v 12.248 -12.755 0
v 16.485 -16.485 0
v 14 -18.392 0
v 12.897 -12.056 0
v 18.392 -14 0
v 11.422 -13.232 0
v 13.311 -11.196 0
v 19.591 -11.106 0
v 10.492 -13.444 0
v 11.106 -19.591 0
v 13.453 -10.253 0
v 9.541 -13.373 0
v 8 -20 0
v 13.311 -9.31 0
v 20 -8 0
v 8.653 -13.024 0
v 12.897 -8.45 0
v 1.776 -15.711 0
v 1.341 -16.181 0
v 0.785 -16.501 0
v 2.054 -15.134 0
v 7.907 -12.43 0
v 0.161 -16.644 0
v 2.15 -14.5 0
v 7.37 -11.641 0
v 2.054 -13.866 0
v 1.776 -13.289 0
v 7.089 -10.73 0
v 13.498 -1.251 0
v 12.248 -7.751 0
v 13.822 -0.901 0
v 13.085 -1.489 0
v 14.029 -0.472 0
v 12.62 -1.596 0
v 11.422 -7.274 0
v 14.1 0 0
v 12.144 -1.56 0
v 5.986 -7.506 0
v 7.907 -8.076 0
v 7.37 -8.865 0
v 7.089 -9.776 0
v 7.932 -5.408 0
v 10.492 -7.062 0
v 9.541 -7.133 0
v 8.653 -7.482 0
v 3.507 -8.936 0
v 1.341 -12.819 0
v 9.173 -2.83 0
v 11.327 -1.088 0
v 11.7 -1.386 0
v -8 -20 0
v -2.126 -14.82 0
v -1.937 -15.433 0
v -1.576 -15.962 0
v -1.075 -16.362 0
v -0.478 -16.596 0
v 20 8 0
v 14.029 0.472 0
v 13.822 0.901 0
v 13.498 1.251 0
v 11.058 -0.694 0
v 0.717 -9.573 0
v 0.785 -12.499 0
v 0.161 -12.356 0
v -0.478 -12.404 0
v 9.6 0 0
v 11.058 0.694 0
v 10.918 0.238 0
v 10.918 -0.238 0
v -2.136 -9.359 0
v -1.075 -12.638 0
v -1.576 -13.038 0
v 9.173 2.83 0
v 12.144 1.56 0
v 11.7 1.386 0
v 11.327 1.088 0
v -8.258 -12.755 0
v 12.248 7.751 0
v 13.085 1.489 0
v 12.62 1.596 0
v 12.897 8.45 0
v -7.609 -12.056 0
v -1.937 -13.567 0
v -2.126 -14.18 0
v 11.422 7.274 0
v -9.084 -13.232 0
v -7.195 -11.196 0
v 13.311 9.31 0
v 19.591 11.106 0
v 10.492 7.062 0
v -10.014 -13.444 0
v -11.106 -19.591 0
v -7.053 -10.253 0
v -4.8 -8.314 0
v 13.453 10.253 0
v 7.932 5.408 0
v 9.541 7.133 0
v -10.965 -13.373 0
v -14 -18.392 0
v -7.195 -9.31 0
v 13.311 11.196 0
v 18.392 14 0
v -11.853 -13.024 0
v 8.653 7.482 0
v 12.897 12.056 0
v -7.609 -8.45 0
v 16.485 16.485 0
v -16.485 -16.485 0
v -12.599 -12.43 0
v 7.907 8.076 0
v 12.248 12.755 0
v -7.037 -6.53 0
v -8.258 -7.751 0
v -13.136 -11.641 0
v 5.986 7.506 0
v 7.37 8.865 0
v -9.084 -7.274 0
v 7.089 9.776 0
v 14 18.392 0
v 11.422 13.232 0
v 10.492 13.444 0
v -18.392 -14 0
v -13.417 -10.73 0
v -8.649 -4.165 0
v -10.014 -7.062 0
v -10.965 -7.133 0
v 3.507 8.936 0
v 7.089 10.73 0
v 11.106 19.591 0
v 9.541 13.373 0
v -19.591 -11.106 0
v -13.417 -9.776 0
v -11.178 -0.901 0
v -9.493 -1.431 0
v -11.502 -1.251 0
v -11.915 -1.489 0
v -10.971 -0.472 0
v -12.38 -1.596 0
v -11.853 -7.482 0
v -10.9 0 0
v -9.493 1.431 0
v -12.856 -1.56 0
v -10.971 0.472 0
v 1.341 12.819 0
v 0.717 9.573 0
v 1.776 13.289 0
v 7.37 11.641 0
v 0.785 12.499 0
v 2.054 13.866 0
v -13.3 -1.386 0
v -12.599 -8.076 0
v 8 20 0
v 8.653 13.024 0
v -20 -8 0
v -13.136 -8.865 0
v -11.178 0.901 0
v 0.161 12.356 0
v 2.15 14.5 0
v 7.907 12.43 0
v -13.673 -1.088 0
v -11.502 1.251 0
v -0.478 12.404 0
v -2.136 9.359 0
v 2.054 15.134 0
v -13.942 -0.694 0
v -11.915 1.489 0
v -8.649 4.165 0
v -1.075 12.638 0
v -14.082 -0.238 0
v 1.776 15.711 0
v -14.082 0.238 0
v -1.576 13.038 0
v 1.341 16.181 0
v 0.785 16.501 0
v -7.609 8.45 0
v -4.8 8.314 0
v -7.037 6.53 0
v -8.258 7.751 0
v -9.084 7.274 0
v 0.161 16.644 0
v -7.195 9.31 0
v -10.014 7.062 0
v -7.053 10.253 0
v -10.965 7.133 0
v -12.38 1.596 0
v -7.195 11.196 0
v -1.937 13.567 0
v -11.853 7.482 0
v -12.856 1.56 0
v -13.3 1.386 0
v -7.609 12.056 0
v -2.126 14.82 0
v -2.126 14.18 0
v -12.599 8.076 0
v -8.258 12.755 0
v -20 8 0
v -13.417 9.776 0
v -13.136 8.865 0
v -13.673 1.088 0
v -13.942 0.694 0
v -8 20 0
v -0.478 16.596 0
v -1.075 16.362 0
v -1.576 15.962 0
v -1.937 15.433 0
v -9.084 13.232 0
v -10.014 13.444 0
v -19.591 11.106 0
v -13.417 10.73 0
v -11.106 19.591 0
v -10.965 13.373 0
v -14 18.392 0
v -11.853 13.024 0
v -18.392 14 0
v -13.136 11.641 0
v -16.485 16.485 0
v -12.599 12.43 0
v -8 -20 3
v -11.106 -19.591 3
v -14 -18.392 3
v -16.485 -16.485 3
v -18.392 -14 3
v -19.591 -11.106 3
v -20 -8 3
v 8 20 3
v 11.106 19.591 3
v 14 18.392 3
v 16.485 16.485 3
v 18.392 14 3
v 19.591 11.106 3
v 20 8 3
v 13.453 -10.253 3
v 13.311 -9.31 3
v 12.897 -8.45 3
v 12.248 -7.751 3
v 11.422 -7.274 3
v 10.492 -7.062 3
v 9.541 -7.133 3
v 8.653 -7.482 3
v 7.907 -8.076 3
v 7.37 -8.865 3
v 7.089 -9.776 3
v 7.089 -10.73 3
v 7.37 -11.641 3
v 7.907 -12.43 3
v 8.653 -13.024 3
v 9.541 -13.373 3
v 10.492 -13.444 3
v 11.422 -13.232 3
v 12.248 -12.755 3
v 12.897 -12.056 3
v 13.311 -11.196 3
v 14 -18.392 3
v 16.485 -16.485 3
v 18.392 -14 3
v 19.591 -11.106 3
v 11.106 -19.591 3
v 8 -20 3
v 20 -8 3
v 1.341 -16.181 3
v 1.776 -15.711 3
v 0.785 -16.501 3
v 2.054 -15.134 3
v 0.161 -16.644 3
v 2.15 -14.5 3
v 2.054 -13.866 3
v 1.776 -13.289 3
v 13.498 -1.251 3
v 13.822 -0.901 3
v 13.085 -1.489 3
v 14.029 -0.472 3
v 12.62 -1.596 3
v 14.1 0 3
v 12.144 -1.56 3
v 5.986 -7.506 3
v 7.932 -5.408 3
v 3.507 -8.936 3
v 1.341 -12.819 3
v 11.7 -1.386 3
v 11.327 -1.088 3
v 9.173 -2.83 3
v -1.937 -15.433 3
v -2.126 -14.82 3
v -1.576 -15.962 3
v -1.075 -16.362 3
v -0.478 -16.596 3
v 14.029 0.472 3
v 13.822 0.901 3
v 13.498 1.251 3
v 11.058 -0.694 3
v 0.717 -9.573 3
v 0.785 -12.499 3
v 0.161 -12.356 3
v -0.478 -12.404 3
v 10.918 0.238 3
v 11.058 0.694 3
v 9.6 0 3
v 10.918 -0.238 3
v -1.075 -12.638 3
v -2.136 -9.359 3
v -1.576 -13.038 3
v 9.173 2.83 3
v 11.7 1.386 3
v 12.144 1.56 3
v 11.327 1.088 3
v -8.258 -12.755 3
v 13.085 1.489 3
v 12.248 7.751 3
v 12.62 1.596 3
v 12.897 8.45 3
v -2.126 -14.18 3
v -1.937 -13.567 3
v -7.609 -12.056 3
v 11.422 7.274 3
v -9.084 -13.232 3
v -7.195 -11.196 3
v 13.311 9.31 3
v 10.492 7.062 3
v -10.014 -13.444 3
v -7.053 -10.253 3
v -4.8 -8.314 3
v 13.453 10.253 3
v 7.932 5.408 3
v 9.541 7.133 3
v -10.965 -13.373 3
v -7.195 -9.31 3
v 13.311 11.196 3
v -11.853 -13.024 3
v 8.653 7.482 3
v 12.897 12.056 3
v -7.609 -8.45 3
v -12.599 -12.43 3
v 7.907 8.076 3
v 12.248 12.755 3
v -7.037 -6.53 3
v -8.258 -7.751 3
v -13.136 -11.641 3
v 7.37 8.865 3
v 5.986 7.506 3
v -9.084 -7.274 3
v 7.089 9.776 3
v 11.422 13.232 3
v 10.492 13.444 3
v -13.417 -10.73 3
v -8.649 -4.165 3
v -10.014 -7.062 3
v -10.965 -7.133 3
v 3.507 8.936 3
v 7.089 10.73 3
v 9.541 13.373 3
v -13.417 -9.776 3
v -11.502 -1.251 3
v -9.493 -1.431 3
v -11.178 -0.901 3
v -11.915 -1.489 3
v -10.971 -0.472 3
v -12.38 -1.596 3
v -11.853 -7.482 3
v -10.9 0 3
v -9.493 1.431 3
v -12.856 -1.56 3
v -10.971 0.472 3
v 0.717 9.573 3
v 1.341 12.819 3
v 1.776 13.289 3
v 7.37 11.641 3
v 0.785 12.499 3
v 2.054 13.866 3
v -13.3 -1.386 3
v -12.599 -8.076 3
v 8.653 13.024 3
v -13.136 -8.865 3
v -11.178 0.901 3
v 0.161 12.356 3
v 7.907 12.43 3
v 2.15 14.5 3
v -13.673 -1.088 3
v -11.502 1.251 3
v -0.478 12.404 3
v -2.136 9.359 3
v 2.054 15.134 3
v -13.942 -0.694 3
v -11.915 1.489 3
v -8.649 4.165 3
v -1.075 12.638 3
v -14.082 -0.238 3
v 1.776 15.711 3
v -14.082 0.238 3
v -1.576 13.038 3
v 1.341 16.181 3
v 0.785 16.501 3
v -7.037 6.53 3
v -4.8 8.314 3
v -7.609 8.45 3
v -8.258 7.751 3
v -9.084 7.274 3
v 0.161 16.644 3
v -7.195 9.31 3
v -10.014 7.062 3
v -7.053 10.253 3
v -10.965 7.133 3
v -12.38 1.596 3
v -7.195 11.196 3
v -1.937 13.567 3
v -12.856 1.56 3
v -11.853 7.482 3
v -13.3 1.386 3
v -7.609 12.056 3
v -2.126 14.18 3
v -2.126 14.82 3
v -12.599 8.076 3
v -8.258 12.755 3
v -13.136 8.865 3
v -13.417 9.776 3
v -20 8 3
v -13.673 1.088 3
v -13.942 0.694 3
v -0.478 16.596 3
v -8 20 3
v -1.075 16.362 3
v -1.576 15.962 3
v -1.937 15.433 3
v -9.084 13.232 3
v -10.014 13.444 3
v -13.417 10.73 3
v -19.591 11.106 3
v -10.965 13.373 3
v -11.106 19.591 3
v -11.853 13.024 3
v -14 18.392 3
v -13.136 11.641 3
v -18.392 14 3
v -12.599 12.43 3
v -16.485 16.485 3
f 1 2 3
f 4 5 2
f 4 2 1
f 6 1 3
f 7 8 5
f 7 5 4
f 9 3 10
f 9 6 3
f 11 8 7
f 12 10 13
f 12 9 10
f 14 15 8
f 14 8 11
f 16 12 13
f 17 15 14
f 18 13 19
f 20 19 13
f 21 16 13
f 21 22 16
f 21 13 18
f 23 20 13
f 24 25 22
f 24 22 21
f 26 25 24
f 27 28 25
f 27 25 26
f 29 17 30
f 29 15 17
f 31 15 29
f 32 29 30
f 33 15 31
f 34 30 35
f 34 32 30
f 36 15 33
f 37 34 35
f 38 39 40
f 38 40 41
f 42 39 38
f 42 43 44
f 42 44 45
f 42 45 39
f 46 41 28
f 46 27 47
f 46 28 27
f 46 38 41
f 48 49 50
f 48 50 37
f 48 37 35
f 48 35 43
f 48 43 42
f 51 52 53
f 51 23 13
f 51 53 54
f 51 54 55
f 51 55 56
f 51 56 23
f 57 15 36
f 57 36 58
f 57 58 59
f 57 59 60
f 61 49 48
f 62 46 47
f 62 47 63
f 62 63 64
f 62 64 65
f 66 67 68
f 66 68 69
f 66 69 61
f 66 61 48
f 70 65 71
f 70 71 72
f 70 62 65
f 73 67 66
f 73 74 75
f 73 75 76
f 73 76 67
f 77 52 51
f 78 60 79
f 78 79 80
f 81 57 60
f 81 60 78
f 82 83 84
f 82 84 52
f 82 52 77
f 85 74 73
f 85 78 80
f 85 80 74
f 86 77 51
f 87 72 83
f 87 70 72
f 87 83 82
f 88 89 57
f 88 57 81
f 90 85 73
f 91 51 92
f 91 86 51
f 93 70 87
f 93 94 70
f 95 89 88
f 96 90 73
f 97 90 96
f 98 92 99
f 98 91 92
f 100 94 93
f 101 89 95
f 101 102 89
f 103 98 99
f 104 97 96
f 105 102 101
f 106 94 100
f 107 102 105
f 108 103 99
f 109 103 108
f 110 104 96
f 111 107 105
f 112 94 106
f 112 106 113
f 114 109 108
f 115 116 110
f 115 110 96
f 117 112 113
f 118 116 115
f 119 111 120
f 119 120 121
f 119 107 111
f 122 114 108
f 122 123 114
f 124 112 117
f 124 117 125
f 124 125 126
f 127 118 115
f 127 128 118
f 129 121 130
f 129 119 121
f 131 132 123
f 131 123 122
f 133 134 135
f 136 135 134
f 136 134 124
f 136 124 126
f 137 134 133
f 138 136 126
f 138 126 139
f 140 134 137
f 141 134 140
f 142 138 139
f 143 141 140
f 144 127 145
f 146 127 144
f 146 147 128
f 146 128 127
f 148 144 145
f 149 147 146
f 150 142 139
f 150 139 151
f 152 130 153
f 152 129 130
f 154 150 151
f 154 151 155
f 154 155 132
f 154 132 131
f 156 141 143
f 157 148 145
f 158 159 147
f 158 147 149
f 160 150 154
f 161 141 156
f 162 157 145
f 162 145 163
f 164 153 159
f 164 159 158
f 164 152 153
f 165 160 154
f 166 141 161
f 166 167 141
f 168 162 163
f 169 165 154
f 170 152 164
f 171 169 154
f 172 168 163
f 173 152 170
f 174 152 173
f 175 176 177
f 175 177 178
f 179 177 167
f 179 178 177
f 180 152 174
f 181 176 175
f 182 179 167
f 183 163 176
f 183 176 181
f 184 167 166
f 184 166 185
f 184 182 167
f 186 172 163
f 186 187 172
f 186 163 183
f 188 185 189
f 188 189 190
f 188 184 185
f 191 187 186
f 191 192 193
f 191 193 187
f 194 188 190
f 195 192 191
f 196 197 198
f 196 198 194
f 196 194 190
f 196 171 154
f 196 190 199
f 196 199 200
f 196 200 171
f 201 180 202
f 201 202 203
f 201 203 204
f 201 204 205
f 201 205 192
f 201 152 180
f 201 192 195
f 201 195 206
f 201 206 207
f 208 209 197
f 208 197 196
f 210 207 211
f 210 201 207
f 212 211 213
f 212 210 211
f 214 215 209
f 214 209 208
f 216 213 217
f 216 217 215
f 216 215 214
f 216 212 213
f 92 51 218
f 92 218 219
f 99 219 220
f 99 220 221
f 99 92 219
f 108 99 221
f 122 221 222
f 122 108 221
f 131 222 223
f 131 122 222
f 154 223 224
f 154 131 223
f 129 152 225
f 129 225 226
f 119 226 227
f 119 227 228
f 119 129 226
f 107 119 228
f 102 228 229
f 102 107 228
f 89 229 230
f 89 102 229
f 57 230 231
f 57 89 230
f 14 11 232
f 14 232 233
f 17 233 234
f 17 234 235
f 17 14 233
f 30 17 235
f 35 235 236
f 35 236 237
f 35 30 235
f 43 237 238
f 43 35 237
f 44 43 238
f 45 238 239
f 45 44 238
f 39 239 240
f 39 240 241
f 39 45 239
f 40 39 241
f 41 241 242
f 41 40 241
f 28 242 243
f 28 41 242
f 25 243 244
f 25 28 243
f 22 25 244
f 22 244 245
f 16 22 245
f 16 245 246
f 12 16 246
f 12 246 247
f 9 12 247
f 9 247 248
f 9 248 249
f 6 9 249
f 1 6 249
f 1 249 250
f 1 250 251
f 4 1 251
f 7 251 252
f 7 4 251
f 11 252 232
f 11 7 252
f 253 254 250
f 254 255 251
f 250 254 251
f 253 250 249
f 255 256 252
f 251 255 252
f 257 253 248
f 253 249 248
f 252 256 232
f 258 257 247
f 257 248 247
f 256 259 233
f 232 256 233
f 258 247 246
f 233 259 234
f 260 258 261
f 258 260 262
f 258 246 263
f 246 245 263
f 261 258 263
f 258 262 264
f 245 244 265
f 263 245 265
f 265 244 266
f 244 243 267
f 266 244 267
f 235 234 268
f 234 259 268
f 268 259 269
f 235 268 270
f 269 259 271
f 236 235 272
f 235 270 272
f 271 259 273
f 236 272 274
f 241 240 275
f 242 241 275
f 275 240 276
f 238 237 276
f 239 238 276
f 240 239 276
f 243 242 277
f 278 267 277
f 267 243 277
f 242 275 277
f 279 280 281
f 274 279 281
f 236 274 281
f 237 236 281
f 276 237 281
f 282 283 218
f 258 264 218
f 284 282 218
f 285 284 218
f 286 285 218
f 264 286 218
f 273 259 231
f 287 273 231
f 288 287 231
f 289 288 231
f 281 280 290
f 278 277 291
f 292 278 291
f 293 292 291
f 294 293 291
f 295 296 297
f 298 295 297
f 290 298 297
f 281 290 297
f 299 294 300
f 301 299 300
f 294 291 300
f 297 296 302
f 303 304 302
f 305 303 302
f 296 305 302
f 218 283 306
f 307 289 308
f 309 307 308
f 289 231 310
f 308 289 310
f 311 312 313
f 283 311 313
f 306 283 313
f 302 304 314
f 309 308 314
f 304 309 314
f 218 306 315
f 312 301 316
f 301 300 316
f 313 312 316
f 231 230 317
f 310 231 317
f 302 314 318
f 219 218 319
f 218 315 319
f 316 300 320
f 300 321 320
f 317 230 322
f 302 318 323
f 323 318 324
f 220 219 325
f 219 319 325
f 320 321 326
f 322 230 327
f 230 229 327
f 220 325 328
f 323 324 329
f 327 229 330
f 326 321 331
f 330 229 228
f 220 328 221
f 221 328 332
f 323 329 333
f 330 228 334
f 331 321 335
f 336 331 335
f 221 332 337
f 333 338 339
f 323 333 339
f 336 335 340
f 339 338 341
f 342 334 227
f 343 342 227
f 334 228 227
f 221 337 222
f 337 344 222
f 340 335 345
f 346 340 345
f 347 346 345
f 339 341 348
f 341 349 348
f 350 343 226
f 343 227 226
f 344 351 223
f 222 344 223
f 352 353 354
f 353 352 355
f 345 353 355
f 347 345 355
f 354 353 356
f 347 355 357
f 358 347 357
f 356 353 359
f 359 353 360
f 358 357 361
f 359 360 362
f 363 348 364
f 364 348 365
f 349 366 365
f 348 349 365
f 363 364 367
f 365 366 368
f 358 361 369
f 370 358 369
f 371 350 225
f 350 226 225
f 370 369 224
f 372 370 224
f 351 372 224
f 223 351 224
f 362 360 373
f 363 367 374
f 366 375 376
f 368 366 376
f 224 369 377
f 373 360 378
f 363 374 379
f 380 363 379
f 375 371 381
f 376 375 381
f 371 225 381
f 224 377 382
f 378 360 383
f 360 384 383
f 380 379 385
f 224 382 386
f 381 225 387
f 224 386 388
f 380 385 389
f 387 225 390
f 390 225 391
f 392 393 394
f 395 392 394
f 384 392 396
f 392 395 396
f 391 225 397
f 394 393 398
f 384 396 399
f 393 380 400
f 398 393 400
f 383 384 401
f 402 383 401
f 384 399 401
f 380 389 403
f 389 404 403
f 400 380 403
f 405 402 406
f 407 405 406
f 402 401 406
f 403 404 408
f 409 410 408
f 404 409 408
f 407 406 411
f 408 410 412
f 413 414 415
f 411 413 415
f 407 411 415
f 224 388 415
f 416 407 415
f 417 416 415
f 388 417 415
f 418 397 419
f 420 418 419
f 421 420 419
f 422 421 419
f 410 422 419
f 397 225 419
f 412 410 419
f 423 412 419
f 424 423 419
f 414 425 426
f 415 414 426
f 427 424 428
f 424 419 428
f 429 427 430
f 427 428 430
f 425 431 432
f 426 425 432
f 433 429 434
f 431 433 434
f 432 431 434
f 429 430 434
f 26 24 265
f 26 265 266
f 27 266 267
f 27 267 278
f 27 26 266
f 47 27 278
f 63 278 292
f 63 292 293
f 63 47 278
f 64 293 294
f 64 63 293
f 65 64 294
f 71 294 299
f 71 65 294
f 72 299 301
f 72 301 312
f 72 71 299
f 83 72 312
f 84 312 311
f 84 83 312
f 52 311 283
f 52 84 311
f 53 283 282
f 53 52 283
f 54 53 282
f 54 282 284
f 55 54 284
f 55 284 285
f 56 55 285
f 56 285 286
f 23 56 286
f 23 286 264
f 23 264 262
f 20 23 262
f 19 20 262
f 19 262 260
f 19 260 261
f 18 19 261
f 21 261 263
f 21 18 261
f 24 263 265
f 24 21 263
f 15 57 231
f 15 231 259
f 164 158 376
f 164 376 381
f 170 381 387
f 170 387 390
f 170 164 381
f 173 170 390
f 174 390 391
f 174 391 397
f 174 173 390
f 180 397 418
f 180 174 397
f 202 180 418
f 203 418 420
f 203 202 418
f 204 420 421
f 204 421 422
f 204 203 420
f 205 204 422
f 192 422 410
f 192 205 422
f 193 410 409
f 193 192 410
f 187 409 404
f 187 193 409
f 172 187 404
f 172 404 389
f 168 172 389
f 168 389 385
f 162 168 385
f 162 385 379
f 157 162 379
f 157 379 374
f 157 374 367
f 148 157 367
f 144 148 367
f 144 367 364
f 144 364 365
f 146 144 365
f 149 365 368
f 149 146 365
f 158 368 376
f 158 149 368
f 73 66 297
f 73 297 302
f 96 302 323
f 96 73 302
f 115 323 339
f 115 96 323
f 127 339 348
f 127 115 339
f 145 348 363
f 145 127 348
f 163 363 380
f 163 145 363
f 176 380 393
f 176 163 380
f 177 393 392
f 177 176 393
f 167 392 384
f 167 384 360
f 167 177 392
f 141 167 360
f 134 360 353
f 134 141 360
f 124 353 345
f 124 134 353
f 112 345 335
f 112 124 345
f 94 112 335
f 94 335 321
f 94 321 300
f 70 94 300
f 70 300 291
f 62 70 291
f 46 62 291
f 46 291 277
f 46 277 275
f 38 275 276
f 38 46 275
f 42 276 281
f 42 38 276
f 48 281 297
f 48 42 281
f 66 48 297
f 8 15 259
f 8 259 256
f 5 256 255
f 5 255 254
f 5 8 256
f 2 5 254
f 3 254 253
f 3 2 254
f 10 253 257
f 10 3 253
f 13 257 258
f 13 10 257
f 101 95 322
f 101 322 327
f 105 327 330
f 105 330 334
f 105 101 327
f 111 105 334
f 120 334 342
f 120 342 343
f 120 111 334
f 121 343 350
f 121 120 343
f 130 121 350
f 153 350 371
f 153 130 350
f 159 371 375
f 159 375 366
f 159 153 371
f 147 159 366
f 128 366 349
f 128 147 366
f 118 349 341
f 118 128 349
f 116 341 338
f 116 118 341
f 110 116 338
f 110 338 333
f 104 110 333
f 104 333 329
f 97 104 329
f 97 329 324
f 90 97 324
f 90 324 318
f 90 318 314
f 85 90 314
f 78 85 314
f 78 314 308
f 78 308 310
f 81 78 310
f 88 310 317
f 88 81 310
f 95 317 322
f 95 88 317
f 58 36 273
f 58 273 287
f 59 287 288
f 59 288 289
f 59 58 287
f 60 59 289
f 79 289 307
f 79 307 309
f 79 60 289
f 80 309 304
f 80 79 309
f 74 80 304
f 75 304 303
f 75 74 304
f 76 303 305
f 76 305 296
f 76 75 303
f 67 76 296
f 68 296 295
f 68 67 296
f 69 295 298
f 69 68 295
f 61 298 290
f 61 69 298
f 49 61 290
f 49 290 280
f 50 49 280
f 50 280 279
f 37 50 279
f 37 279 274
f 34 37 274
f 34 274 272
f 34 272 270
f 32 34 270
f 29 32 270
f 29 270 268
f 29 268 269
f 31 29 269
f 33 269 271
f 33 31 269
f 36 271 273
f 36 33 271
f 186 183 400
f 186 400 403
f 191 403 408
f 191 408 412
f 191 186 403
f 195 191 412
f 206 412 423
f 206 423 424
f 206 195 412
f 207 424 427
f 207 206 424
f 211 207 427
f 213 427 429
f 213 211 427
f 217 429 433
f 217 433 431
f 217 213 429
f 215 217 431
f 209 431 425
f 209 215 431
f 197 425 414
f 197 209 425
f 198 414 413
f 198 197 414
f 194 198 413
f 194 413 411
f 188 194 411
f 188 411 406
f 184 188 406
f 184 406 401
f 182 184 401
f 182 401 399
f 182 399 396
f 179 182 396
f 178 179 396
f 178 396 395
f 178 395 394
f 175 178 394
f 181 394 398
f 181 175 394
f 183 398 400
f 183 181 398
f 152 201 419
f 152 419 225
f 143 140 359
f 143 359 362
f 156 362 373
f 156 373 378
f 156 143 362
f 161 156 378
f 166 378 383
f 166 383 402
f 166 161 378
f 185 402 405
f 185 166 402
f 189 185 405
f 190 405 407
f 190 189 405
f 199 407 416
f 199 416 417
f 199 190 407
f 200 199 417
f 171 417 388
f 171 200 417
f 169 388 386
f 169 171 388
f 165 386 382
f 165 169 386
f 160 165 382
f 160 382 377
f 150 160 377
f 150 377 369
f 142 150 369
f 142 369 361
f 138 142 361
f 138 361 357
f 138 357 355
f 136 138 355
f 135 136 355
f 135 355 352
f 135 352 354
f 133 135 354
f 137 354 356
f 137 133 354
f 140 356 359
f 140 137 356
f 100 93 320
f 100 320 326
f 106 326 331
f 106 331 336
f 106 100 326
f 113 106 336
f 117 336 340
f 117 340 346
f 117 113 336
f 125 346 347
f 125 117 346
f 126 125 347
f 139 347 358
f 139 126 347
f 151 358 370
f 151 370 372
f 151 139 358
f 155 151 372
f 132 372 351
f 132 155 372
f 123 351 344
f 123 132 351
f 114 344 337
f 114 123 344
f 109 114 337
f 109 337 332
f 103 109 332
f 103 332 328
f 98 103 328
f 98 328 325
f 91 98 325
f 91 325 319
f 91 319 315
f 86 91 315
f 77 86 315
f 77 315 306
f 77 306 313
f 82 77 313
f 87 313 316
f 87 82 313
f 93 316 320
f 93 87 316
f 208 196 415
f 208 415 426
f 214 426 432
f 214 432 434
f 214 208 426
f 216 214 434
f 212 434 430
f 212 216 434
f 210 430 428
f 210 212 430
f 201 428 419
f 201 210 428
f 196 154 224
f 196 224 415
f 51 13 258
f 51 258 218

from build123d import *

# Parameters (mm, degrees)
SKETCH1_R           = 9.6
SKETCH1_R_2         = 2.15
SKETCH1_R_3         = 1.6
SKETCH1_R_4         = 3.2
BOSS_EXTRUDE1_DEPTH = 3


with BuildPart() as part:
    # Sketch1 → Boss-Extrude1 (new body)
    with BuildSketch(Plane.XY):
        with BuildLine():
            Line((8, -20), (-8, -20))
            ThreePointArc((-8, -20), (-16.485281374, -16.485281374), (-20, -8))
            Line((-20, -8), (-20, 8))
            ThreePointArc((-20, 8), (-16.485281374, 16.485281374), (-8, 20))
            Line((-8, 20), (8, 20))
            ThreePointArc((8, 20), (16.485281374, 16.485281374), (20, 8))
            Line((20, 8), (20, -8))
            ThreePointArc((20, -8), (16.485281374, -16.485281374), (8, -20))
        make_face()
        Circle(SKETCH1_R, mode=Mode.SUBTRACT)
        with Locations((0, 14.5)):
            Circle(SKETCH1_R_2, mode=Mode.SUBTRACT)
        with Locations((-12.5, 0)):
            Circle(SKETCH1_R_3, mode=Mode.SUBTRACT)
        with Locations((12.5, 0)):
            Circle(SKETCH1_R_3, mode=Mode.SUBTRACT)
        with Locations((0, -14.5)):
            Circle(SKETCH1_R_2, mode=Mode.SUBTRACT)
        with Locations((10.253048327, 10.253048327)):
            Circle(SKETCH1_R_4, mode=Mode.SUBTRACT)
        with Locations((10.253048327, -10.253048327)):
            Circle(SKETCH1_R_4, mode=Mode.SUBTRACT)
        with Locations((-10.253048327, -10.253048327)):
            Circle(SKETCH1_R_4, mode=Mode.SUBTRACT)
        with Locations((-10.253048327, 10.253048327)):
            Circle(SKETCH1_R_4, mode=Mode.SUBTRACT)
    extrude(amount=BOSS_EXTRUDE1_DEPTH)


solid = part.part
